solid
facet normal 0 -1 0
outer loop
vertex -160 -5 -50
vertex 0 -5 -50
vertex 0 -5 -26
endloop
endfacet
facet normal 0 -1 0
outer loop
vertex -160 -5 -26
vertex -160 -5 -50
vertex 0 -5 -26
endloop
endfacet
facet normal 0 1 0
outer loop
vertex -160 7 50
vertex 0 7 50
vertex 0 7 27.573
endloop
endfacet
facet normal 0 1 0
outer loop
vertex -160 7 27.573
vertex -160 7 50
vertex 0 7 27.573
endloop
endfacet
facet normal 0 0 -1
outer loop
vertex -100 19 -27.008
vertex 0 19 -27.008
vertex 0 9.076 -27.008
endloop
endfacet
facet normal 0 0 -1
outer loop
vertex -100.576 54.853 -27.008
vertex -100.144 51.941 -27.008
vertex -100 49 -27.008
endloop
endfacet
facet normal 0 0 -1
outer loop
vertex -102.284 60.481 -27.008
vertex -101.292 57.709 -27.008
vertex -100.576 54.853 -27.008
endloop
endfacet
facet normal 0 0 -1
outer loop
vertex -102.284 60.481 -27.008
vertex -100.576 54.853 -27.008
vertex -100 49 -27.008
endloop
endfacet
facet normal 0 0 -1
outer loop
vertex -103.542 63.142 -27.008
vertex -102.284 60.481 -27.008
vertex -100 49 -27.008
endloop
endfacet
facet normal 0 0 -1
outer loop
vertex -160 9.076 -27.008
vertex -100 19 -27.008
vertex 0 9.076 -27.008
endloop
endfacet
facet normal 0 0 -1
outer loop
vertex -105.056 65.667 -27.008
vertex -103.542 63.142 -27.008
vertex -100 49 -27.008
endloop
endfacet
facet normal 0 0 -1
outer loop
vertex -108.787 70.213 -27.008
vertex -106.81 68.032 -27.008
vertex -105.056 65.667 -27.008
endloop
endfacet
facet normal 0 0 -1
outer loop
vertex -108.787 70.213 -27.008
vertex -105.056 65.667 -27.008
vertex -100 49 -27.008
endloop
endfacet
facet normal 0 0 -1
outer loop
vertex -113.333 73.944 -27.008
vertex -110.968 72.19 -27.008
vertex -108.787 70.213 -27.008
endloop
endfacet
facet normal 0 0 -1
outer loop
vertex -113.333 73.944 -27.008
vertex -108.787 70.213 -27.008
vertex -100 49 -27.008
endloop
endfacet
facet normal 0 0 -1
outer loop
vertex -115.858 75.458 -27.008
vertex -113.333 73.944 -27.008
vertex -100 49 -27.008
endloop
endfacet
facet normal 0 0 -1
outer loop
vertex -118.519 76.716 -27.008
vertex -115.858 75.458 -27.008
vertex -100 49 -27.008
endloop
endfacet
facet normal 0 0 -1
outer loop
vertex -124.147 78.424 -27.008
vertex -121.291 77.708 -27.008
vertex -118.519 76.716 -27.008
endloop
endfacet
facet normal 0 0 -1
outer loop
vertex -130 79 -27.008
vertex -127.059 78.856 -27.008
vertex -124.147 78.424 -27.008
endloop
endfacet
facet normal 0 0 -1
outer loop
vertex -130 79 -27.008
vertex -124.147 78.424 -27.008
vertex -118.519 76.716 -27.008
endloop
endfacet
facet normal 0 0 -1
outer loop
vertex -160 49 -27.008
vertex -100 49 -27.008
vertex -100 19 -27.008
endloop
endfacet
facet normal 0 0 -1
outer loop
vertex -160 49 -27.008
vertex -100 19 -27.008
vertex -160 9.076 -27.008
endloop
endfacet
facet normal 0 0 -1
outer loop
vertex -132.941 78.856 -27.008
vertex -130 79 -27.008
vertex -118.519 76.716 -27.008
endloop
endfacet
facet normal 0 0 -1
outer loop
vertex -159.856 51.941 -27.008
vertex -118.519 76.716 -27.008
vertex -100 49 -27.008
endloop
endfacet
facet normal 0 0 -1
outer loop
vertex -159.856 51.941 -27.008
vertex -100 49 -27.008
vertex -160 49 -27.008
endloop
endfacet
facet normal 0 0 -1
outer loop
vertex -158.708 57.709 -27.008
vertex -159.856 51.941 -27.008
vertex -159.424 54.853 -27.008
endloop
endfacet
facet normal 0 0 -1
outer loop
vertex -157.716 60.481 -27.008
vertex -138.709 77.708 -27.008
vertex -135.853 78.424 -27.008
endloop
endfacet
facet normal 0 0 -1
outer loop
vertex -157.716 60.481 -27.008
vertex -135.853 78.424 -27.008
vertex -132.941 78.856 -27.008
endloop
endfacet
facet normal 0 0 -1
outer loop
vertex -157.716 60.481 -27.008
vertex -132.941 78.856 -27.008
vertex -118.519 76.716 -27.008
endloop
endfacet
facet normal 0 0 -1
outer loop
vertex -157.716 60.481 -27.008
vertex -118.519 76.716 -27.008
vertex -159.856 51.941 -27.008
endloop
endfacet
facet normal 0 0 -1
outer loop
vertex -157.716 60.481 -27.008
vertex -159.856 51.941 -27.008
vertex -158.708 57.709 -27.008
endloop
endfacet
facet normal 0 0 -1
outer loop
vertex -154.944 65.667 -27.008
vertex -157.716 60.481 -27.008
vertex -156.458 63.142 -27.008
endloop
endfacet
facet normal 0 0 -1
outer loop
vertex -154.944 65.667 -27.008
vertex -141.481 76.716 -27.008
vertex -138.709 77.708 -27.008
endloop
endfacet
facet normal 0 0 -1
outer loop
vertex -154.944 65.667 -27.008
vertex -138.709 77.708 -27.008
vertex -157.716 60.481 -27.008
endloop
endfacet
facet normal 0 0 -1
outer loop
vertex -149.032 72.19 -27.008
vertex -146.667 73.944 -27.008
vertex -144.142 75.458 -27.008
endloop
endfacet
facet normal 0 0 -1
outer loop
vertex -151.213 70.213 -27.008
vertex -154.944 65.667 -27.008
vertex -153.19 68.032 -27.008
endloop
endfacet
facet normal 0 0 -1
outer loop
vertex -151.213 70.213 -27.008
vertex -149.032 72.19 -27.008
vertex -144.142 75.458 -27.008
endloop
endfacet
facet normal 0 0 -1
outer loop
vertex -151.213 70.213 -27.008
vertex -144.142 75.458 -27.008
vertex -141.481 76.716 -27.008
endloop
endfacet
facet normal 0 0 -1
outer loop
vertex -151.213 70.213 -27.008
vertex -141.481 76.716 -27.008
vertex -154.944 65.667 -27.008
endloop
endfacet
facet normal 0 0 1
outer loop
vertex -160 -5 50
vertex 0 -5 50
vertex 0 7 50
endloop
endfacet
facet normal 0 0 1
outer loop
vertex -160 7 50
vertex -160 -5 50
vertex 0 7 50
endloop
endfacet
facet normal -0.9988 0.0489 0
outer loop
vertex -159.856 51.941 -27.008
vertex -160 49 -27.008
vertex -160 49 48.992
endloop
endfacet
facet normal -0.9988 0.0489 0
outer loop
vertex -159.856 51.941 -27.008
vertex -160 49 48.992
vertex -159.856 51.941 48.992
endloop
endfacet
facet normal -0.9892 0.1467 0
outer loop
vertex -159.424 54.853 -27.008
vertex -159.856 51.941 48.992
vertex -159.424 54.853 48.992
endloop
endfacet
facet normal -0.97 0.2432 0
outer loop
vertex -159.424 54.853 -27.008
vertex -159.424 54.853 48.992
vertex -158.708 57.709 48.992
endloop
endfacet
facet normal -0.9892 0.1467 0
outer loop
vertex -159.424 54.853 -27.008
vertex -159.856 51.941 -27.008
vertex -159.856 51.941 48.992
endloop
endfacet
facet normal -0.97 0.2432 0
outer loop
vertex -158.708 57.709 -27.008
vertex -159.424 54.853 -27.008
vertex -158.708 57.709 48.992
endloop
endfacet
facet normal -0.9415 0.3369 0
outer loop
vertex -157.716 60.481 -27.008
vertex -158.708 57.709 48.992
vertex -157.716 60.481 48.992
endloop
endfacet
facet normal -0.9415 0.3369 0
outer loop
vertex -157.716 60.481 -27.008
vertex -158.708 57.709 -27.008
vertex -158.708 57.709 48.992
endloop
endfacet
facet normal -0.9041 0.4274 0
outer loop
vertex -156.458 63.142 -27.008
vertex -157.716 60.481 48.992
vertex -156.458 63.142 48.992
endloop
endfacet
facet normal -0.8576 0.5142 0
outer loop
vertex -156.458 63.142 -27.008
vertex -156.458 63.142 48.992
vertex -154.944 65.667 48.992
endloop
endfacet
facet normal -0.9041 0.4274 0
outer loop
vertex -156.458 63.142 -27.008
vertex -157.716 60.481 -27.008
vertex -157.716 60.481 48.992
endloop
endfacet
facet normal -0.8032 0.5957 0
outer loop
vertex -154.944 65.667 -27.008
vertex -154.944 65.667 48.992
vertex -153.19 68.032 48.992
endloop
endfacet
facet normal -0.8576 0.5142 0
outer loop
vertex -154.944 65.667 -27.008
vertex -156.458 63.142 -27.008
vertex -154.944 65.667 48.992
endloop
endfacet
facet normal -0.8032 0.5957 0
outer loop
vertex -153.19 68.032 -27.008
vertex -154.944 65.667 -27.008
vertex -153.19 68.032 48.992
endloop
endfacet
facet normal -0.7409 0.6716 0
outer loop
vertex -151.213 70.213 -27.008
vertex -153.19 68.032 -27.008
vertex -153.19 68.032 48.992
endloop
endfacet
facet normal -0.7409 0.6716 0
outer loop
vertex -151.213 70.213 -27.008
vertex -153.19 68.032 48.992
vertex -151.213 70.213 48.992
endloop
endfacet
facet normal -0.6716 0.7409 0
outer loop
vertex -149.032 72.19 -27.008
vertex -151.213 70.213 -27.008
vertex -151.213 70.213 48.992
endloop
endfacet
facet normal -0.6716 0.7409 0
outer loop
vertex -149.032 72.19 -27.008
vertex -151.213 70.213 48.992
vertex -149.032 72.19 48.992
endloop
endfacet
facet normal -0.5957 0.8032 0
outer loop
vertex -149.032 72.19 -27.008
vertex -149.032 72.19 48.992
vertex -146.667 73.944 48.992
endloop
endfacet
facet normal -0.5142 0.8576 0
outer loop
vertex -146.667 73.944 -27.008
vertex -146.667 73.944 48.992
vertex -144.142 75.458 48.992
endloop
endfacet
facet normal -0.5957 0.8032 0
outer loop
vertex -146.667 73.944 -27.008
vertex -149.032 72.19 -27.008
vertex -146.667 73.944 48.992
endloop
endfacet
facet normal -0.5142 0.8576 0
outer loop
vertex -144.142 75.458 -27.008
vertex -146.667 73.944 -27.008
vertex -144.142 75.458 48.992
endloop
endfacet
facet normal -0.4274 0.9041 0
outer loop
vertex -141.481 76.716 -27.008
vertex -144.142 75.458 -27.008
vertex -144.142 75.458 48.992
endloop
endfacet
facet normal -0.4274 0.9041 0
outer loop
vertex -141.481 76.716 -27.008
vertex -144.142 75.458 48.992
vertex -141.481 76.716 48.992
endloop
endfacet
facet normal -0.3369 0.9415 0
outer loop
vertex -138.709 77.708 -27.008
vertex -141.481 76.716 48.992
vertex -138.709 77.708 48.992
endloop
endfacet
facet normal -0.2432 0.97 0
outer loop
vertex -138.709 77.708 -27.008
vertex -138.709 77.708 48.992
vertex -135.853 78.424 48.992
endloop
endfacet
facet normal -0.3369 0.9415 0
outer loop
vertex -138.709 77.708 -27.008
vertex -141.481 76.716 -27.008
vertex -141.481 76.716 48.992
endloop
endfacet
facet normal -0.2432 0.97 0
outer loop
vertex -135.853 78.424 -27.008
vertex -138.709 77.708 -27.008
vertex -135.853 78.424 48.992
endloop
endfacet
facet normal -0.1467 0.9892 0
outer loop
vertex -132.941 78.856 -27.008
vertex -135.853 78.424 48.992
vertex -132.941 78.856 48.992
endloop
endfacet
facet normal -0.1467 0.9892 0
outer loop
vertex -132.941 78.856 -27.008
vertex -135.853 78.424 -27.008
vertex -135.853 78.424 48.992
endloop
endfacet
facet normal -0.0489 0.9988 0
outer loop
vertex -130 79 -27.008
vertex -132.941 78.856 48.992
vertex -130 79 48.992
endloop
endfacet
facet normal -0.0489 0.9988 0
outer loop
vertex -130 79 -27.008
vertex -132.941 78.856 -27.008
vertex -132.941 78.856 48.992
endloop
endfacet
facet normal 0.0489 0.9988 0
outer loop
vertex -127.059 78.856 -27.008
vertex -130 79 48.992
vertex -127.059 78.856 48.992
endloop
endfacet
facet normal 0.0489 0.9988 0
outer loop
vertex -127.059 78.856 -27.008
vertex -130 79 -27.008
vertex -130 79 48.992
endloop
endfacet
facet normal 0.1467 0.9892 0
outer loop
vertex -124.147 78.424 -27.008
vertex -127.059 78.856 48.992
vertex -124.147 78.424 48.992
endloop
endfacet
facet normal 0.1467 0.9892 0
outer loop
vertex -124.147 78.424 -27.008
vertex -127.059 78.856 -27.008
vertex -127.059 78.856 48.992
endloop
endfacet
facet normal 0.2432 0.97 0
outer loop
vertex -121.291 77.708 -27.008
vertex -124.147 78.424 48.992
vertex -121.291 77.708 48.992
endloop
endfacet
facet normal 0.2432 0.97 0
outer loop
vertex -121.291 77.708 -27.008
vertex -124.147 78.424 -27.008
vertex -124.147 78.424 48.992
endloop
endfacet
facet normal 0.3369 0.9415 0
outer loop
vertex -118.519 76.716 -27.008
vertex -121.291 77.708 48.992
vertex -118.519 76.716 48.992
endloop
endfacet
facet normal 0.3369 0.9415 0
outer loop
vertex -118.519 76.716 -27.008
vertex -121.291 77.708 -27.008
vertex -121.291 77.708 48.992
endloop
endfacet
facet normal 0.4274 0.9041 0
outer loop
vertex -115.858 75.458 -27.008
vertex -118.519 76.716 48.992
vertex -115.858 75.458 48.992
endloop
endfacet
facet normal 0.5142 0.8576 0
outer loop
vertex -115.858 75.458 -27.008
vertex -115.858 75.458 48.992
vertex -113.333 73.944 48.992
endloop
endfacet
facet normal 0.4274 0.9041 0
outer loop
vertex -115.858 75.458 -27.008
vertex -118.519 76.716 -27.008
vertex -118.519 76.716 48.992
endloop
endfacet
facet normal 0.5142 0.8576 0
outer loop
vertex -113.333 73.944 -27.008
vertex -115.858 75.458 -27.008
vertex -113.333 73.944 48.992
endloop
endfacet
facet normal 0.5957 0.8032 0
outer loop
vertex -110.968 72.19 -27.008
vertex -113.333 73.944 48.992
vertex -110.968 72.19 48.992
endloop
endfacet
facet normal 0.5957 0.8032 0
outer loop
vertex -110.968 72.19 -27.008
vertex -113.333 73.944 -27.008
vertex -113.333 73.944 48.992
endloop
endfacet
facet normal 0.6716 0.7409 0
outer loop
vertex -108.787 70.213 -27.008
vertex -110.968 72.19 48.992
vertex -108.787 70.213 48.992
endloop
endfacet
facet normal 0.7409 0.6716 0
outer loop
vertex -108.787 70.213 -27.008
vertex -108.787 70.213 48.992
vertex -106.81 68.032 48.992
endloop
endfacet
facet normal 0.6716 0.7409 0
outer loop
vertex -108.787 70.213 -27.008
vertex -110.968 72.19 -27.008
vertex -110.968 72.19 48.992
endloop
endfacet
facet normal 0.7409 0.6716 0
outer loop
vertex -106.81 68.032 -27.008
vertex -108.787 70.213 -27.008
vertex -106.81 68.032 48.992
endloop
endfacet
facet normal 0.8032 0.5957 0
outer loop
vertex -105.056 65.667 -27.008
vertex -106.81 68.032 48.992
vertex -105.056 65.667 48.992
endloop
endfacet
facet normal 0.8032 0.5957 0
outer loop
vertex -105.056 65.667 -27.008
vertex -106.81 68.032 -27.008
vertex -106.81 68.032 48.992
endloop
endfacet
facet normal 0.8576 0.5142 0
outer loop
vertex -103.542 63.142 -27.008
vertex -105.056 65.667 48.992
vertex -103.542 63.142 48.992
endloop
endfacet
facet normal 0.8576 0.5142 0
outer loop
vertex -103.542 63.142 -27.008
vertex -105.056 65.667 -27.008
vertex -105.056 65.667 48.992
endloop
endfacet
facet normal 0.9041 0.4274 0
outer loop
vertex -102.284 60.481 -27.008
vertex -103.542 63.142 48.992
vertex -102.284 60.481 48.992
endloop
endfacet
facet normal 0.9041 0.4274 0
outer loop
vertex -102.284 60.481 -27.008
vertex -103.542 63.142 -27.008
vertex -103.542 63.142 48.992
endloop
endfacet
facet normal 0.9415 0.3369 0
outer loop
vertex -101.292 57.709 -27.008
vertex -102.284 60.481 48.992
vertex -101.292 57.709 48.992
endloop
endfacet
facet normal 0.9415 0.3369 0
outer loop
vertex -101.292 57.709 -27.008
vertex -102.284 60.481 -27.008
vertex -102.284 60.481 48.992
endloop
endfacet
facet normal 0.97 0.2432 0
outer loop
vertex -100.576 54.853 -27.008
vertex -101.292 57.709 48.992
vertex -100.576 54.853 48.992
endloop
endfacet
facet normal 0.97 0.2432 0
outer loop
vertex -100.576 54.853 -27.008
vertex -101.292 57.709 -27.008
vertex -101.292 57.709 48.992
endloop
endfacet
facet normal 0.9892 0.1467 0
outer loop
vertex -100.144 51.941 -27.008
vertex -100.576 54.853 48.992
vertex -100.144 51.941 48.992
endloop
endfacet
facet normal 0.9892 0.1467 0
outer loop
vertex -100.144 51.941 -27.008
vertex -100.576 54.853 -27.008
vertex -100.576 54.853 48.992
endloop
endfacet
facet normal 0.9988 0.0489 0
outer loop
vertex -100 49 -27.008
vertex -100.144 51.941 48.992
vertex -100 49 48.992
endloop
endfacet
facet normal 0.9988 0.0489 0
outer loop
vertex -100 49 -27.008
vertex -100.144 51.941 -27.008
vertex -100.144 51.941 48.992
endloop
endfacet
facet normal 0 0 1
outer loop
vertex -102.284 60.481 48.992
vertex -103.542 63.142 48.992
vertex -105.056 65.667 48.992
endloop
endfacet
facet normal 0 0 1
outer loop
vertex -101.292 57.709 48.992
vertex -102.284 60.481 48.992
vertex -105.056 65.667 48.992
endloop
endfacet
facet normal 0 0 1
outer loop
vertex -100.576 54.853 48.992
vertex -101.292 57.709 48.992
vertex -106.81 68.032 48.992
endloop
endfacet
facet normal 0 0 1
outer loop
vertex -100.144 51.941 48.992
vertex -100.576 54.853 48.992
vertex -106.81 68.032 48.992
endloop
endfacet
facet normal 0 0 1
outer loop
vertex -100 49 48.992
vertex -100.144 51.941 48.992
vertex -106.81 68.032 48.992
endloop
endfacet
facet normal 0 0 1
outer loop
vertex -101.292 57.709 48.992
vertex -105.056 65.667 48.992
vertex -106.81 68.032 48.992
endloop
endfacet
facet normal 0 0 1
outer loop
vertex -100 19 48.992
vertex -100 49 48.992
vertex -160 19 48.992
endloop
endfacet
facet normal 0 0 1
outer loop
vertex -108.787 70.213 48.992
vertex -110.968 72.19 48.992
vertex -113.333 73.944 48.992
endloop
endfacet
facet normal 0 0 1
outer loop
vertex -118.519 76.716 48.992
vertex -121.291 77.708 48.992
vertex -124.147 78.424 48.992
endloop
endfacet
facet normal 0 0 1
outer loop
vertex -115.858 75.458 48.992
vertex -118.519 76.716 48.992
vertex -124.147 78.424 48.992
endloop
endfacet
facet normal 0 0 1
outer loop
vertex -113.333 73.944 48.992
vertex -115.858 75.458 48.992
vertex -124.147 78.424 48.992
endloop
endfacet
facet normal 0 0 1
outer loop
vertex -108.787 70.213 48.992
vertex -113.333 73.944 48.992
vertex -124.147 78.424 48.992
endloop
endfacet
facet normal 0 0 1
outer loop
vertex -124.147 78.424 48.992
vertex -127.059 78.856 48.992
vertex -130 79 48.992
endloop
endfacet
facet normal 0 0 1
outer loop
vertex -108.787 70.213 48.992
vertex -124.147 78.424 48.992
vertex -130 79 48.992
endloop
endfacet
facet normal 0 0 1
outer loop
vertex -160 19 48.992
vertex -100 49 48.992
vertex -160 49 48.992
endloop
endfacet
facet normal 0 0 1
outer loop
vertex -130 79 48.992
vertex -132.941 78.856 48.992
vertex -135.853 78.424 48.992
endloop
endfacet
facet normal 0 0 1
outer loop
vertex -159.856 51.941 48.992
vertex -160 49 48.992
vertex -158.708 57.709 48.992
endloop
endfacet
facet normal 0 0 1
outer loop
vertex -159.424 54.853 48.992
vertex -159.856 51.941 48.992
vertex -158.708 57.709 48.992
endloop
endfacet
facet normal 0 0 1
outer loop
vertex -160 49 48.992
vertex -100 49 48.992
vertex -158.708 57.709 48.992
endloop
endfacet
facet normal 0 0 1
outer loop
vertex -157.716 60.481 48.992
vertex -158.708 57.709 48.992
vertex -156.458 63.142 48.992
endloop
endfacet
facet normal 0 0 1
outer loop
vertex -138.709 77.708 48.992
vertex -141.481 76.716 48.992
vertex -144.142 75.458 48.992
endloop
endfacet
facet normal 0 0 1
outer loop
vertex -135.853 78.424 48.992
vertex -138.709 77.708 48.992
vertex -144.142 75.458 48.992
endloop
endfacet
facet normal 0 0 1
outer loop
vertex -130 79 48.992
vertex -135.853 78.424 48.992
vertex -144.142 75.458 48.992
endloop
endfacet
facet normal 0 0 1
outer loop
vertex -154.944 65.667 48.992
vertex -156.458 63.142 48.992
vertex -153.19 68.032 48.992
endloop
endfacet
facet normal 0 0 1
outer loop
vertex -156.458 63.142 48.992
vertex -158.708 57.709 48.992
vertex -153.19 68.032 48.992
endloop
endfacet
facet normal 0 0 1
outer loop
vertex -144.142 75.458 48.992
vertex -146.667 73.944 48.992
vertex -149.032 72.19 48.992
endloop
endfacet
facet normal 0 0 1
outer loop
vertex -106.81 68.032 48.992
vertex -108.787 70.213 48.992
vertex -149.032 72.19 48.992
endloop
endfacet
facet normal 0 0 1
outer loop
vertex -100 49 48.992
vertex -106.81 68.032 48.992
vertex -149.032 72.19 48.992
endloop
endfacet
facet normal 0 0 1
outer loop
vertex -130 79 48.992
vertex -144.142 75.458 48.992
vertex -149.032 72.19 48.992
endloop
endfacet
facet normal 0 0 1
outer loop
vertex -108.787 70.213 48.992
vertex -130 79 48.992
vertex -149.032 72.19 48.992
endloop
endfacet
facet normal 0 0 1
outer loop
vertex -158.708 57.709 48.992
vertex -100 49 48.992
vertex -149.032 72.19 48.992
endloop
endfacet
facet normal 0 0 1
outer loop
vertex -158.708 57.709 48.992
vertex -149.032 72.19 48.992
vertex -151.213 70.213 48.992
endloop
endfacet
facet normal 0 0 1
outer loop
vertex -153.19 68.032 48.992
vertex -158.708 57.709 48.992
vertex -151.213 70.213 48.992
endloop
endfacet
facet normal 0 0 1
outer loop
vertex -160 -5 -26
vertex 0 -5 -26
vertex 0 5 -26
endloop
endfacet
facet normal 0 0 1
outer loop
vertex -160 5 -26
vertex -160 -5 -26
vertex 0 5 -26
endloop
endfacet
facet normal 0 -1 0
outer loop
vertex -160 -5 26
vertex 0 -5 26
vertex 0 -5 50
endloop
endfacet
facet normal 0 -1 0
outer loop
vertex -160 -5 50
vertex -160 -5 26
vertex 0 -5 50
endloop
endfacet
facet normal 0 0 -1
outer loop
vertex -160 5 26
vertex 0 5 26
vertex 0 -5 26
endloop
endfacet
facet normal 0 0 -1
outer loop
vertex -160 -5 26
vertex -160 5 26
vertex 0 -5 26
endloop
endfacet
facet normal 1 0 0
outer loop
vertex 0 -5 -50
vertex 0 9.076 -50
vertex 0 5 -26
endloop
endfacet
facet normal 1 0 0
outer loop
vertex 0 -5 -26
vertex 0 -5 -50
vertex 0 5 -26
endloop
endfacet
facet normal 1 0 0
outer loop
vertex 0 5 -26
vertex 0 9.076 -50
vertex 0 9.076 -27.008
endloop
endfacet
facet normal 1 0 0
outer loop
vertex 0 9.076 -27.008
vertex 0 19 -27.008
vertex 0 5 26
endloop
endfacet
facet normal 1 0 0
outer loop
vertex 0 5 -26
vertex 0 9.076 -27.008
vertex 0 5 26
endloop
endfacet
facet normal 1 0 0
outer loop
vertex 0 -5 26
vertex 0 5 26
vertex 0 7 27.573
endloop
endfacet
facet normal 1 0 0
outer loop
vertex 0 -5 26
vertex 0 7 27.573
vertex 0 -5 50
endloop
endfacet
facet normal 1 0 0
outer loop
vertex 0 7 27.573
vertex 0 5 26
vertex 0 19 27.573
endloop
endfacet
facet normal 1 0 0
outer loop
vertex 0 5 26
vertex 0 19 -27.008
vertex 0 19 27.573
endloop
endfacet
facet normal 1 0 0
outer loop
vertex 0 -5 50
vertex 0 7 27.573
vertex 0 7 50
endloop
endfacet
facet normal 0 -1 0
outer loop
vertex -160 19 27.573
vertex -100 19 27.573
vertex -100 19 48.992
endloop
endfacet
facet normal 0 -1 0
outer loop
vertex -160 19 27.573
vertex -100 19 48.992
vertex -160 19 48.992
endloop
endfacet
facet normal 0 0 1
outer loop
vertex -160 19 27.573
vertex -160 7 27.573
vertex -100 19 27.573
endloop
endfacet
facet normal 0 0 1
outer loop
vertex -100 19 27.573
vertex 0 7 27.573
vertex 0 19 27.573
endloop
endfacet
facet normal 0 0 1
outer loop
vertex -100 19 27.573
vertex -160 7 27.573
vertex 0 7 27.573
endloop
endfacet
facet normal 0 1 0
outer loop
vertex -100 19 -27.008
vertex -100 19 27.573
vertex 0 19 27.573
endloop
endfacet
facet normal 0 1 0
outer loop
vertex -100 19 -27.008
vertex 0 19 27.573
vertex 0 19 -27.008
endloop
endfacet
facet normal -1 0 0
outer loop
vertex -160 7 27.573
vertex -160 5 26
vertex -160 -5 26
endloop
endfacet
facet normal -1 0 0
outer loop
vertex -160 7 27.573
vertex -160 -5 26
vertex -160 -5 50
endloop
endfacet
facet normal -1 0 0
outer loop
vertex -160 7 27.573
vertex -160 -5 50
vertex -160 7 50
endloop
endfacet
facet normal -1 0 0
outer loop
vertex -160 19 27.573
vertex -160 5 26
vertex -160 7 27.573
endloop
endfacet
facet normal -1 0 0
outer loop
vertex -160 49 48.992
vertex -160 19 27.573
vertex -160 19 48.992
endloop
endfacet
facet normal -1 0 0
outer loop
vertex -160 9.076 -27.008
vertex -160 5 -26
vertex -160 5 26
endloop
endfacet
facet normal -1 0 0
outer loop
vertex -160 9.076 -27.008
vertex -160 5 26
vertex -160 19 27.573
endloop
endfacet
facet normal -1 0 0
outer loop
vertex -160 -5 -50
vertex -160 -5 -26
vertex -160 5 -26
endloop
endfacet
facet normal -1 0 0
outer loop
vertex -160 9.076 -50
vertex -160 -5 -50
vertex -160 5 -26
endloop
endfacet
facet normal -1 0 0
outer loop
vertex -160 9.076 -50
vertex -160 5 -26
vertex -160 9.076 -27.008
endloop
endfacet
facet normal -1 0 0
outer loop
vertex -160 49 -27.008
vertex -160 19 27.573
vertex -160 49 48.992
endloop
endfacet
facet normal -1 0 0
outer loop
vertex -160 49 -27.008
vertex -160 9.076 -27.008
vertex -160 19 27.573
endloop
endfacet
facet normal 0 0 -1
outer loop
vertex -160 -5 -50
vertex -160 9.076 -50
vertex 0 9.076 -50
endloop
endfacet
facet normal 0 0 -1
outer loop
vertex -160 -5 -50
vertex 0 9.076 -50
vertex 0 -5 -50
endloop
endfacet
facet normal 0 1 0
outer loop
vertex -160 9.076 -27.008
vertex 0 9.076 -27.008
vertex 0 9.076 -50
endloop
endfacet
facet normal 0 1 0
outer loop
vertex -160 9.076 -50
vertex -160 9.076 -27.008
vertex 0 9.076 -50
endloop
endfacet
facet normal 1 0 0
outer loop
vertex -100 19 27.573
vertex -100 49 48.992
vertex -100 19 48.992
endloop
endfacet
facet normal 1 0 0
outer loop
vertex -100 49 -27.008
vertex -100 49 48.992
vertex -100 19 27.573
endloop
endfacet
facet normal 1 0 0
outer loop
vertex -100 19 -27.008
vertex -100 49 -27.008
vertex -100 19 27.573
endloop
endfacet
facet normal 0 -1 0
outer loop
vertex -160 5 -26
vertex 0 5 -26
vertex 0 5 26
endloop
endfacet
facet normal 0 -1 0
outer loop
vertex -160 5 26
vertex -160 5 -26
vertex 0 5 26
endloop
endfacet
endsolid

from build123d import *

# Parameters (mm, degrees)
BOSS_EXTRUDE1_DEPTH = 160
SKETCH2_R           = 15
BOSS_EXTRUDE2_DEPTH = 76


with BuildPart() as part:
    # Sketch1 → Boss-Extrude1 (new body)
    with BuildSketch(Plane(origin=(0, 0, 0), x_dir=(0, 0, -1), z_dir=(1, 0, 0))):
        Polygon((-26, -5), (-50, -5), (-50, 7), (-27.572519084, 7), (-27.572519084, 19), (27.007633588, 19), (27.007633588, 9.076335878), (50, 9.076335878), (50, -5), (26, -5), (26, 5), (-26, 5), align=None)
    extrude(amount=-BOSS_EXTRUDE1_DEPTH)

    # Sketch2 → Boss-Extrude2 (add)
    with BuildSketch(Plane(origin=(0, 0, -27.007633588), x_dir=(-1, 0, 0), z_dir=(0, 0, -1))):
        with BuildLine():
            Line((100, 19), (160, 19))
            Line((160, 19), (160, 49))
            ThreePointArc((160, 49), (130, 79), (100, 49))
            Line((100, 49), (100, 19))
        make_face()
        with Locations((130, 49)):
            Circle(SKETCH2_R, mode=Mode.SUBTRACT)
        with Locations((130, 49)):
            Circle(SKETCH2_R)
    extrude(amount=-BOSS_EXTRUDE2_DEPTH)


solid = part.part
